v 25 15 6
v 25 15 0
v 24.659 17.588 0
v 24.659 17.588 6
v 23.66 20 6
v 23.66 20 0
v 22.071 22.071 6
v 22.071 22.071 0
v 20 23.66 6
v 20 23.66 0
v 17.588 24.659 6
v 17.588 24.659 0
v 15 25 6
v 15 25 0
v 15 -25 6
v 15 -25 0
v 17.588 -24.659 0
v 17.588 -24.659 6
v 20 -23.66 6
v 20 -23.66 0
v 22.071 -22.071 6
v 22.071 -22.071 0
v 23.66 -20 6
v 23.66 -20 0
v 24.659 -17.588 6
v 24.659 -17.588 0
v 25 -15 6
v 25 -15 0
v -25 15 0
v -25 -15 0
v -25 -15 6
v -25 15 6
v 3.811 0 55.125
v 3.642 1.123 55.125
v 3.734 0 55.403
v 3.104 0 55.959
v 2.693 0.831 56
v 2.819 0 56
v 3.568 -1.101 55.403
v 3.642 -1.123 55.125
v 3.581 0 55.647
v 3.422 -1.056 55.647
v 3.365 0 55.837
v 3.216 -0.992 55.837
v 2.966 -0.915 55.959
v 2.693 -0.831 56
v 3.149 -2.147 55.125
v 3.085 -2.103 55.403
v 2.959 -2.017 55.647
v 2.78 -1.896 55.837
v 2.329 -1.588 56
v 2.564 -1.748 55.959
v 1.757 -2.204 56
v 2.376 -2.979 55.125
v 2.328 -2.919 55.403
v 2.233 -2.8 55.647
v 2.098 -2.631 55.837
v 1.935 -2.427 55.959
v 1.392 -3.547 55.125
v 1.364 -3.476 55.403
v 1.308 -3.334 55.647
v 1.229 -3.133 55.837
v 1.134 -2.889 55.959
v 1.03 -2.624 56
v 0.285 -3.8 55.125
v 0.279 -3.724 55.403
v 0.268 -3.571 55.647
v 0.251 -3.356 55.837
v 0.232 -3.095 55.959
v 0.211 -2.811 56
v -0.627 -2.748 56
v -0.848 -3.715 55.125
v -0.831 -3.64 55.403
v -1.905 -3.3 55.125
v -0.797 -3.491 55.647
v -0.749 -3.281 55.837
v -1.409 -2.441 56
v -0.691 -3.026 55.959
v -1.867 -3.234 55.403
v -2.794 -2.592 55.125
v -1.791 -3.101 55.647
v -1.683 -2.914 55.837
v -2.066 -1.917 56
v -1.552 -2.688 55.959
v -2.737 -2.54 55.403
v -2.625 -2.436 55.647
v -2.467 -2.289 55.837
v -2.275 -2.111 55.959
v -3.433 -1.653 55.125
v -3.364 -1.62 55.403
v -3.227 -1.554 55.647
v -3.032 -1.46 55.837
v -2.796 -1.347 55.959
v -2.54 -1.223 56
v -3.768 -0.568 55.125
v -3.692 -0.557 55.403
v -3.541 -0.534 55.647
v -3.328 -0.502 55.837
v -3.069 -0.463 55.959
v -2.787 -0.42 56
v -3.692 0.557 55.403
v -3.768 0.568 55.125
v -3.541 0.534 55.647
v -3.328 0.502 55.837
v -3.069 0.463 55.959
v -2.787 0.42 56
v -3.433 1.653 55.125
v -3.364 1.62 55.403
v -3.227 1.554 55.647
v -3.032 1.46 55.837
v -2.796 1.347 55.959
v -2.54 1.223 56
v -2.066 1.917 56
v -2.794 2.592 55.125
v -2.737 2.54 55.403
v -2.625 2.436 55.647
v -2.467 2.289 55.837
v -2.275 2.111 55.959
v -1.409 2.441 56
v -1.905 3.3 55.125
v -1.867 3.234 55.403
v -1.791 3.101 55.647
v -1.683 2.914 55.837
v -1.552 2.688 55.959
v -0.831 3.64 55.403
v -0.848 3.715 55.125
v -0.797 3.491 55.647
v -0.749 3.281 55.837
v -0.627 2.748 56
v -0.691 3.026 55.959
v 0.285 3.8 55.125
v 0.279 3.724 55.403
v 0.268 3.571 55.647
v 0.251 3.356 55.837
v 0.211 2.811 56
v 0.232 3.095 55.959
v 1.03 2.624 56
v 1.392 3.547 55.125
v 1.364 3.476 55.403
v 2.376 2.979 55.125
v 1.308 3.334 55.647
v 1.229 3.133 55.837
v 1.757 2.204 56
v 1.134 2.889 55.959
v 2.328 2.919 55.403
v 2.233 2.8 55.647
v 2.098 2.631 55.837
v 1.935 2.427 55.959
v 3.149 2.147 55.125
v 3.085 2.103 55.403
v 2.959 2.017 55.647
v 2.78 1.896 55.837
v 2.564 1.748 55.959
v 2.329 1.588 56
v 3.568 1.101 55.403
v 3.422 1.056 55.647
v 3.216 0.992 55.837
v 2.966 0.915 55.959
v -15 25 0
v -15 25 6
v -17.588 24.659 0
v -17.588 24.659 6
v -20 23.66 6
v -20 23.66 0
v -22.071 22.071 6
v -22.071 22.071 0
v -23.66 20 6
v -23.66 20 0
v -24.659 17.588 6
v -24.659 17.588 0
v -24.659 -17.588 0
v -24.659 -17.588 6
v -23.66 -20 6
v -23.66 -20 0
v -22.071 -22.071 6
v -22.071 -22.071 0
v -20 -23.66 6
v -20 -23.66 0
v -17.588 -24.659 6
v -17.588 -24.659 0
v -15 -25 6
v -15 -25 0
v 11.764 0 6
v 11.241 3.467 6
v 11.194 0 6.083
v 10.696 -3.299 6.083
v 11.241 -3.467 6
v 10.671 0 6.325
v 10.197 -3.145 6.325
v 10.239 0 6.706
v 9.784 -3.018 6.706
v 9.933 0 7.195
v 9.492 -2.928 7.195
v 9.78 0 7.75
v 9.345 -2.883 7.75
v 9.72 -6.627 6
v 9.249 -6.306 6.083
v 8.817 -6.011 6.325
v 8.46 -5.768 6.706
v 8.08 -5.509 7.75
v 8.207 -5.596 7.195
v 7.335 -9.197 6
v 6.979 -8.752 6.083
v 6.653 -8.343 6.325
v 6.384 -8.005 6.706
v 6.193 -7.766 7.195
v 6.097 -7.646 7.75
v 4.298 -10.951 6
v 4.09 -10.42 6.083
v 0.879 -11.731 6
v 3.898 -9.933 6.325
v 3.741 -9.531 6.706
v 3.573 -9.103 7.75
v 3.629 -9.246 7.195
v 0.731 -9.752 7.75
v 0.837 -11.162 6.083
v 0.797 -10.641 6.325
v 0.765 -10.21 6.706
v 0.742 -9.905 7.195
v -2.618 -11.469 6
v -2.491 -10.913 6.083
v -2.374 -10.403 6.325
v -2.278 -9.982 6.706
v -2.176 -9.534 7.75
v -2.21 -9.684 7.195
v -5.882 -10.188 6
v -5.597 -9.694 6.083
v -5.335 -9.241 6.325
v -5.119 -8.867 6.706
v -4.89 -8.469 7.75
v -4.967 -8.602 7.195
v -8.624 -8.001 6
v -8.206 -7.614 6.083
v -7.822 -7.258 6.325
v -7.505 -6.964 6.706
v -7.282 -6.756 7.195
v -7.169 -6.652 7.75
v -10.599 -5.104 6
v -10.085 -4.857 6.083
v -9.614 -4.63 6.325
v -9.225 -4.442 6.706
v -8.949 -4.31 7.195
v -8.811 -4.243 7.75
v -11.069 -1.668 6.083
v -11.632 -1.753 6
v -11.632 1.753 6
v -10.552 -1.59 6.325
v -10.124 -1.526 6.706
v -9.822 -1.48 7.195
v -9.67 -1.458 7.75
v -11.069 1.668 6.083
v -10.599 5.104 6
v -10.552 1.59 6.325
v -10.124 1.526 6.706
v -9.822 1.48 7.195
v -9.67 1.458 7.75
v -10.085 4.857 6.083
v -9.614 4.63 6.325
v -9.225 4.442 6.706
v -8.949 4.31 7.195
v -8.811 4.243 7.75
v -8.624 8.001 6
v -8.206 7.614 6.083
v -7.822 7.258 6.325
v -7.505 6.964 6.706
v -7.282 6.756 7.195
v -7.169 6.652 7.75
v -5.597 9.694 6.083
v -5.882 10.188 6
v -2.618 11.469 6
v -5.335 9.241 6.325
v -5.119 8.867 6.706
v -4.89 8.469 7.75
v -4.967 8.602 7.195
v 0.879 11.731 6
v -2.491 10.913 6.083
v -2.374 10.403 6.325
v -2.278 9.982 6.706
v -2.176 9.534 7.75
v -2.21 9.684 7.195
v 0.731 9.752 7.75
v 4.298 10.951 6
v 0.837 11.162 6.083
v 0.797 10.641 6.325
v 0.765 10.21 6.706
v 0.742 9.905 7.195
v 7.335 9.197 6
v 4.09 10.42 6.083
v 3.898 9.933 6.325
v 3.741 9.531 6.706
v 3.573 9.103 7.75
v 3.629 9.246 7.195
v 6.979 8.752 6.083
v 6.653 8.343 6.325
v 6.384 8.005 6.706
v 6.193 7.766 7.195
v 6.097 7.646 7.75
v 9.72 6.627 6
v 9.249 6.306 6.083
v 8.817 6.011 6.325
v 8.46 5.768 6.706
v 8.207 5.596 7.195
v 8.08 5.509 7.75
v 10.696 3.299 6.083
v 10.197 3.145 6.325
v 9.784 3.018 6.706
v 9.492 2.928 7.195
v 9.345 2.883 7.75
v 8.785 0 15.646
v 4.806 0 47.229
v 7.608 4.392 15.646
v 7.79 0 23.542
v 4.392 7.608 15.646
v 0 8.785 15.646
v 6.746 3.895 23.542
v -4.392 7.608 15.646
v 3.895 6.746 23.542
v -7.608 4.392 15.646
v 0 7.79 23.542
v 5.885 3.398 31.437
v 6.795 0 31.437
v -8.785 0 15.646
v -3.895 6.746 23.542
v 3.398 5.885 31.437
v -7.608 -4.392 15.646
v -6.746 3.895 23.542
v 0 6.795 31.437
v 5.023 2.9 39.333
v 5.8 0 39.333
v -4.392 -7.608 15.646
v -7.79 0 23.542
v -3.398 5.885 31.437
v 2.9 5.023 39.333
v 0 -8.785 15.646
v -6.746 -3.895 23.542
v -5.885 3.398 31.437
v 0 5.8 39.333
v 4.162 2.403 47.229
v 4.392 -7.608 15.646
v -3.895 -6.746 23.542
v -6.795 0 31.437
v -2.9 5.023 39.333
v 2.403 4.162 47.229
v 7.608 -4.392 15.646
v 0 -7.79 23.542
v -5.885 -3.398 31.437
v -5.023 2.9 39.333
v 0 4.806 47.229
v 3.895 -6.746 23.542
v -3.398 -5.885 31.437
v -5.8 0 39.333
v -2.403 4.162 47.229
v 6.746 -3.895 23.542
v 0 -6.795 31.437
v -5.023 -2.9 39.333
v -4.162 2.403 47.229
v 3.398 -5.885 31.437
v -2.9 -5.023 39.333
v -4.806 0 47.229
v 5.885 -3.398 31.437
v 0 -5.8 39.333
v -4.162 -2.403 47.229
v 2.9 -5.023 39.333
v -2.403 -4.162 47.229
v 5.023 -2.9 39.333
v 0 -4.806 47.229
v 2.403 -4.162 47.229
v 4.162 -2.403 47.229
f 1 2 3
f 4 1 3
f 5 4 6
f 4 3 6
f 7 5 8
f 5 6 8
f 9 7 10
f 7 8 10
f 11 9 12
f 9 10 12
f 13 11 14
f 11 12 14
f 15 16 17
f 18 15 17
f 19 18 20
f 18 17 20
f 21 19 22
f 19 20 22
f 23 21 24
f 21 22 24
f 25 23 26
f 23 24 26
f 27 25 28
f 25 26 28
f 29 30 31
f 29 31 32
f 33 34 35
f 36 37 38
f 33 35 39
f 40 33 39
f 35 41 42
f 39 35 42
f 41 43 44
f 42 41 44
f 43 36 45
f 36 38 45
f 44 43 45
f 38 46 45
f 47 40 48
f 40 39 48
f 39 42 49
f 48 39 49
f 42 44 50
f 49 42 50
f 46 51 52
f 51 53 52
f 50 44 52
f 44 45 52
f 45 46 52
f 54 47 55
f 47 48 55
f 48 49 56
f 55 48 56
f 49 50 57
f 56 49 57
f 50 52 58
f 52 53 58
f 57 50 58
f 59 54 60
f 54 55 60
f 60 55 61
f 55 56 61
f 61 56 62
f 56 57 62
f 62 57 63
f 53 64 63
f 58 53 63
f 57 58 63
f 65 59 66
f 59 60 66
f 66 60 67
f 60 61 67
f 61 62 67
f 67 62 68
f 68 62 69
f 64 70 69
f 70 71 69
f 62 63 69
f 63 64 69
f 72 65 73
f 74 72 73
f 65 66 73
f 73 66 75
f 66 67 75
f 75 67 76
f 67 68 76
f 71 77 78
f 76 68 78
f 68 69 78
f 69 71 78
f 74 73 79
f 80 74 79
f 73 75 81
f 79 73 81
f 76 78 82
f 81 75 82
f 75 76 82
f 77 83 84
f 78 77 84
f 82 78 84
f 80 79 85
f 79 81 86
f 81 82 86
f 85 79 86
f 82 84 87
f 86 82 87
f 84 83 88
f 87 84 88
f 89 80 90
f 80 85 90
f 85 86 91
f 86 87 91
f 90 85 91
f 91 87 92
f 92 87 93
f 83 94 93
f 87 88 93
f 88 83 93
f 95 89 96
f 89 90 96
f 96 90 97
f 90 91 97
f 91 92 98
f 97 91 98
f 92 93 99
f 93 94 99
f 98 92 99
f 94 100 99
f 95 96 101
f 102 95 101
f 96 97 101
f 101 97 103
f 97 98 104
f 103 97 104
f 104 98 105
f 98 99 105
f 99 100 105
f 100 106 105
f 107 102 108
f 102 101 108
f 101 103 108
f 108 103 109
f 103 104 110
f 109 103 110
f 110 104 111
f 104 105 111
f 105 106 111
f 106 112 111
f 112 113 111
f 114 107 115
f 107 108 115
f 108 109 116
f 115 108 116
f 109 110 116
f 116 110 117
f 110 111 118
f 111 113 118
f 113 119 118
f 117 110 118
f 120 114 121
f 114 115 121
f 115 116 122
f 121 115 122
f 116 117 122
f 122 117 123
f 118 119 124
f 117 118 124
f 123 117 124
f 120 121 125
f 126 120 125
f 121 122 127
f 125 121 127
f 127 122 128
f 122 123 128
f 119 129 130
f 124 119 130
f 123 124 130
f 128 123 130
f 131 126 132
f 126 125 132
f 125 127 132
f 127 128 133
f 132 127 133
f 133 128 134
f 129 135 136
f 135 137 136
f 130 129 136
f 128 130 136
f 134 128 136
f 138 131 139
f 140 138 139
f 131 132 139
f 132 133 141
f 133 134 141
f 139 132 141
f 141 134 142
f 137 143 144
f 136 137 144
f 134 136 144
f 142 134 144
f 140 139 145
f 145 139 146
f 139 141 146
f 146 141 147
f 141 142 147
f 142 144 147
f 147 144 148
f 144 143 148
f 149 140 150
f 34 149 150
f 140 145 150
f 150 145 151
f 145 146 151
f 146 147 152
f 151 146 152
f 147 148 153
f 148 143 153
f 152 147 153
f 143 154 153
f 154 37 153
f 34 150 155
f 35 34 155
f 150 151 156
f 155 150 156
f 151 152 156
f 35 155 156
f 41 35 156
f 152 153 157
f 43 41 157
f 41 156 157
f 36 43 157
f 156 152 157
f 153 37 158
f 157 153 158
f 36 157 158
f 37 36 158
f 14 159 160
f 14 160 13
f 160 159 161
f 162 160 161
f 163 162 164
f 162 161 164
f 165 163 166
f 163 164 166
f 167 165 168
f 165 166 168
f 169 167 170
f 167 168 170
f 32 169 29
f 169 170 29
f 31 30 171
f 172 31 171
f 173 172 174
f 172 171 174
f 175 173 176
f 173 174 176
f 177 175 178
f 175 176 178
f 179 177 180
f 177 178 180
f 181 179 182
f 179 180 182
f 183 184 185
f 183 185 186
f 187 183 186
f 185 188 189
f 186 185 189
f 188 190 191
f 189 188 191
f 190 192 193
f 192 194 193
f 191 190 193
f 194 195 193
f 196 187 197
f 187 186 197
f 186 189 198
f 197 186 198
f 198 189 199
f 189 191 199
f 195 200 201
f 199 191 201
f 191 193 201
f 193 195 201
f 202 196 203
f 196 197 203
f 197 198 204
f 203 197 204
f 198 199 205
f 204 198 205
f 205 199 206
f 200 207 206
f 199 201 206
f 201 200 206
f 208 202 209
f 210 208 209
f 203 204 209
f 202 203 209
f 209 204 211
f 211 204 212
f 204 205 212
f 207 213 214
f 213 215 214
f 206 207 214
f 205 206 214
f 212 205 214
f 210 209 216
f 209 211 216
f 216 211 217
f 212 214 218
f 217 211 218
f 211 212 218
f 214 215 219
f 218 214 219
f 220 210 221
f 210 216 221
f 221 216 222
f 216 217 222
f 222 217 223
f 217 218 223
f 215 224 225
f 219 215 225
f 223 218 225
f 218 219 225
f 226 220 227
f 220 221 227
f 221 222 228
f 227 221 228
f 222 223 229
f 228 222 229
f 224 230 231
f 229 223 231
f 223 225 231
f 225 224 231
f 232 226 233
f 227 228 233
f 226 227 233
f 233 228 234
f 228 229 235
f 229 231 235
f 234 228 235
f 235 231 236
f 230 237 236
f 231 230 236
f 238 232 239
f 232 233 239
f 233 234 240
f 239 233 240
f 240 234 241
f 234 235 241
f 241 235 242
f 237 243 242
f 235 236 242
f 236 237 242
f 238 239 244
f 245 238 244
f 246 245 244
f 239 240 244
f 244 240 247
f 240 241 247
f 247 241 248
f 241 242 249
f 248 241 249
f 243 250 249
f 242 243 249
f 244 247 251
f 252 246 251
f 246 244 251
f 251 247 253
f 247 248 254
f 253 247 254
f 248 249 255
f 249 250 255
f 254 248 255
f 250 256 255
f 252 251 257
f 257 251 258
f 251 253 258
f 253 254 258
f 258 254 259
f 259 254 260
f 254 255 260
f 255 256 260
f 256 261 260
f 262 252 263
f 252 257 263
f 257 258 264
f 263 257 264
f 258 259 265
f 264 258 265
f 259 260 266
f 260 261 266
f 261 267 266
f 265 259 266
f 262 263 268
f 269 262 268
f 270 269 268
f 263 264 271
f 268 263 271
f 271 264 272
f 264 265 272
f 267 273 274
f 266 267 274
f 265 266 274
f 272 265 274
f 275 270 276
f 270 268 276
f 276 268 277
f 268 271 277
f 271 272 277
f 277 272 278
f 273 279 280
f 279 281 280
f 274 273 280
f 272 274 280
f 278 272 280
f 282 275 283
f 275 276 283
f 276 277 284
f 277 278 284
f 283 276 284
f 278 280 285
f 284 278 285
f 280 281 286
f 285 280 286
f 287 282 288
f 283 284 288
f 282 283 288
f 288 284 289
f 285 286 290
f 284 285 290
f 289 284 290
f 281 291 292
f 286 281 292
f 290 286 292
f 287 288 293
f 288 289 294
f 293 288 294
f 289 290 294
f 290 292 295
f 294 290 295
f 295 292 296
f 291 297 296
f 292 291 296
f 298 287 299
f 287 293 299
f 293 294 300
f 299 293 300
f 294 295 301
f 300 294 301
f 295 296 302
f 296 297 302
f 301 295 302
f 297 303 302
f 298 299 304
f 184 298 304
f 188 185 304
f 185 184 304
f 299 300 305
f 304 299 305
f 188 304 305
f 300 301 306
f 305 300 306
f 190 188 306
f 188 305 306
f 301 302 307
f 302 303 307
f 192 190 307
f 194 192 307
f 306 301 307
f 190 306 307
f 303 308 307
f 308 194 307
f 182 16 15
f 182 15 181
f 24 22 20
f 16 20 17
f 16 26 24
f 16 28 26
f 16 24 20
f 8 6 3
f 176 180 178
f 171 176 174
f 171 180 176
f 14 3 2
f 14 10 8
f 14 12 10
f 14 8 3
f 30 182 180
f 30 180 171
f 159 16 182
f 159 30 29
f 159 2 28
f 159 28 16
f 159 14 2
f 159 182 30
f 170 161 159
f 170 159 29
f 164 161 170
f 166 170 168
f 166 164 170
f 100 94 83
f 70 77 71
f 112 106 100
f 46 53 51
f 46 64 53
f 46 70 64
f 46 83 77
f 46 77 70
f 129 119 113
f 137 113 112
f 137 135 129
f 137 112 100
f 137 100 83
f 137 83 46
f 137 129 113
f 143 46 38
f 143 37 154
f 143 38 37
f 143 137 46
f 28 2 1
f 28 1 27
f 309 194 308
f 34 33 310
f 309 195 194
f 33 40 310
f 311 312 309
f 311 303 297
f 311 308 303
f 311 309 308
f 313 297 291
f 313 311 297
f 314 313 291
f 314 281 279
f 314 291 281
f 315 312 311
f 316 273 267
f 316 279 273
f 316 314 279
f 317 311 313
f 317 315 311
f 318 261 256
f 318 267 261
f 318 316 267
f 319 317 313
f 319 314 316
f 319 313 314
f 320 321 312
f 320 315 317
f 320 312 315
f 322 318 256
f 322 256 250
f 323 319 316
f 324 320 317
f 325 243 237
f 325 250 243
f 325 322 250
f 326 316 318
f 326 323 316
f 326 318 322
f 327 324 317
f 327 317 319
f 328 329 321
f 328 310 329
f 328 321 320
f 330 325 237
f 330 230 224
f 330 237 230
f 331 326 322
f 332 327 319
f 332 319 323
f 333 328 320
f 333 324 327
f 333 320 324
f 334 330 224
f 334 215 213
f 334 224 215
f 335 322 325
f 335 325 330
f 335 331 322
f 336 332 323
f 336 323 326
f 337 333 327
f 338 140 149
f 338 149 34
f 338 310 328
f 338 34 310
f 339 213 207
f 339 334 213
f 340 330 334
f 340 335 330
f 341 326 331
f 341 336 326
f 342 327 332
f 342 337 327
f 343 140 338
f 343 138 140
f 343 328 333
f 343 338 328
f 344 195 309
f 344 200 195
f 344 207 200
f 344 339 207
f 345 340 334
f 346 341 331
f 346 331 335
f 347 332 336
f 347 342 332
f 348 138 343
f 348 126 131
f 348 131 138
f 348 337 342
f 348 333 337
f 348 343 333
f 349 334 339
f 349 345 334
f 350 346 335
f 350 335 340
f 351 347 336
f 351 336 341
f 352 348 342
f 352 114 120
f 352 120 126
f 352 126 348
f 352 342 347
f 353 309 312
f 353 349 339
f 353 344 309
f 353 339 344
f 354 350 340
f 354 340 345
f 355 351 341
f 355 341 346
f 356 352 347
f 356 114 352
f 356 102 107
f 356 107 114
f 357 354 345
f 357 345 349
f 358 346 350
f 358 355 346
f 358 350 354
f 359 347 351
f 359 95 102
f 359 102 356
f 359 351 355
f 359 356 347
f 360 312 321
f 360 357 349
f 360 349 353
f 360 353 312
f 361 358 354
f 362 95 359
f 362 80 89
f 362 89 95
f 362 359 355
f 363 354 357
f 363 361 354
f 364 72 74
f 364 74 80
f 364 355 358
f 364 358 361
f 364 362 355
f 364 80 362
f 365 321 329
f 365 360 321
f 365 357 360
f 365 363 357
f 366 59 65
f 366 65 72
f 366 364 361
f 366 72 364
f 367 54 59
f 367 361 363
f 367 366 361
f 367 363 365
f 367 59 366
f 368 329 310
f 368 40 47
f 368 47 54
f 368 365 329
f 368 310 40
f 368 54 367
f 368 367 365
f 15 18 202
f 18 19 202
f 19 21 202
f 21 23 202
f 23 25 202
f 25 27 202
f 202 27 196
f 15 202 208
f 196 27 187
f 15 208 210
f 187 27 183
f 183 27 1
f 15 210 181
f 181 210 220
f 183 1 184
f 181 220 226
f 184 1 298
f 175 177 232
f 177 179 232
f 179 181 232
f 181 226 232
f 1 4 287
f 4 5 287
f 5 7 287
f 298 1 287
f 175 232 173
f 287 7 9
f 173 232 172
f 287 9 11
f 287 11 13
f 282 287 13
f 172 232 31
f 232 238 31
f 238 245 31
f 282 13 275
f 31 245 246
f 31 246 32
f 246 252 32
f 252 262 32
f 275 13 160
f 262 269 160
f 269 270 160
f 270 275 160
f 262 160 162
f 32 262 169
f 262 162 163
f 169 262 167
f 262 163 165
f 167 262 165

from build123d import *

# Parameters (mm, degrees)
PAD_DEPTH    = 6
SKETCH001_R  = 10
PAD001_DEPTH = 50
PAD001_TAPER = 7.180756
FILLET_R     = 2
FILLET001_R  = 1


with BuildPart() as part:
    # Sketch → Pad (new body)
    with BuildSketch(Plane.XY):
        with BuildLine():
            Line((15, -25), (-15, -25))
            ThreePointArc((-25, -15), (-22.071068, -22.071068), (-15, -25))
            Line((-25, -15), (-25, 15))
            ThreePointArc((-15, 25), (-22.071068, 22.071068), (-25, 15))
            Line((-15, 25), (15, 25))
            ThreePointArc((25, 15), (22.071068, 22.071068), (15, 25))
            Line((25, 15), (25, -15))
            ThreePointArc((15, -25), (22.071068, -22.071068), (25, -15))
        make_face()
    extrude(amount=PAD_DEPTH)

    # Sketch001 (on Face10 of Pad) → Pad001 (join)
    with BuildSketch(Plane.XY.offset(6)):
        Circle(SKETCH001_R)
    extrude(amount=PAD001_DEPTH, taper=PAD001_TAPER)

    # Fillet
    fillet_edges = [part.edges().sort_by_distance(p)[0] for p in [
        (-10, 0, 6),
    ]]
    fillet(fillet_edges, radius=FILLET_R)

    # Fillet001
    fillet001_edges = [part.edges().sort_by_distance(p)[0] for p in [
        (-3.700592, 0, 56),
    ]]
    fillet(fillet001_edges, radius=FILLET001_R)


solid = part.part
